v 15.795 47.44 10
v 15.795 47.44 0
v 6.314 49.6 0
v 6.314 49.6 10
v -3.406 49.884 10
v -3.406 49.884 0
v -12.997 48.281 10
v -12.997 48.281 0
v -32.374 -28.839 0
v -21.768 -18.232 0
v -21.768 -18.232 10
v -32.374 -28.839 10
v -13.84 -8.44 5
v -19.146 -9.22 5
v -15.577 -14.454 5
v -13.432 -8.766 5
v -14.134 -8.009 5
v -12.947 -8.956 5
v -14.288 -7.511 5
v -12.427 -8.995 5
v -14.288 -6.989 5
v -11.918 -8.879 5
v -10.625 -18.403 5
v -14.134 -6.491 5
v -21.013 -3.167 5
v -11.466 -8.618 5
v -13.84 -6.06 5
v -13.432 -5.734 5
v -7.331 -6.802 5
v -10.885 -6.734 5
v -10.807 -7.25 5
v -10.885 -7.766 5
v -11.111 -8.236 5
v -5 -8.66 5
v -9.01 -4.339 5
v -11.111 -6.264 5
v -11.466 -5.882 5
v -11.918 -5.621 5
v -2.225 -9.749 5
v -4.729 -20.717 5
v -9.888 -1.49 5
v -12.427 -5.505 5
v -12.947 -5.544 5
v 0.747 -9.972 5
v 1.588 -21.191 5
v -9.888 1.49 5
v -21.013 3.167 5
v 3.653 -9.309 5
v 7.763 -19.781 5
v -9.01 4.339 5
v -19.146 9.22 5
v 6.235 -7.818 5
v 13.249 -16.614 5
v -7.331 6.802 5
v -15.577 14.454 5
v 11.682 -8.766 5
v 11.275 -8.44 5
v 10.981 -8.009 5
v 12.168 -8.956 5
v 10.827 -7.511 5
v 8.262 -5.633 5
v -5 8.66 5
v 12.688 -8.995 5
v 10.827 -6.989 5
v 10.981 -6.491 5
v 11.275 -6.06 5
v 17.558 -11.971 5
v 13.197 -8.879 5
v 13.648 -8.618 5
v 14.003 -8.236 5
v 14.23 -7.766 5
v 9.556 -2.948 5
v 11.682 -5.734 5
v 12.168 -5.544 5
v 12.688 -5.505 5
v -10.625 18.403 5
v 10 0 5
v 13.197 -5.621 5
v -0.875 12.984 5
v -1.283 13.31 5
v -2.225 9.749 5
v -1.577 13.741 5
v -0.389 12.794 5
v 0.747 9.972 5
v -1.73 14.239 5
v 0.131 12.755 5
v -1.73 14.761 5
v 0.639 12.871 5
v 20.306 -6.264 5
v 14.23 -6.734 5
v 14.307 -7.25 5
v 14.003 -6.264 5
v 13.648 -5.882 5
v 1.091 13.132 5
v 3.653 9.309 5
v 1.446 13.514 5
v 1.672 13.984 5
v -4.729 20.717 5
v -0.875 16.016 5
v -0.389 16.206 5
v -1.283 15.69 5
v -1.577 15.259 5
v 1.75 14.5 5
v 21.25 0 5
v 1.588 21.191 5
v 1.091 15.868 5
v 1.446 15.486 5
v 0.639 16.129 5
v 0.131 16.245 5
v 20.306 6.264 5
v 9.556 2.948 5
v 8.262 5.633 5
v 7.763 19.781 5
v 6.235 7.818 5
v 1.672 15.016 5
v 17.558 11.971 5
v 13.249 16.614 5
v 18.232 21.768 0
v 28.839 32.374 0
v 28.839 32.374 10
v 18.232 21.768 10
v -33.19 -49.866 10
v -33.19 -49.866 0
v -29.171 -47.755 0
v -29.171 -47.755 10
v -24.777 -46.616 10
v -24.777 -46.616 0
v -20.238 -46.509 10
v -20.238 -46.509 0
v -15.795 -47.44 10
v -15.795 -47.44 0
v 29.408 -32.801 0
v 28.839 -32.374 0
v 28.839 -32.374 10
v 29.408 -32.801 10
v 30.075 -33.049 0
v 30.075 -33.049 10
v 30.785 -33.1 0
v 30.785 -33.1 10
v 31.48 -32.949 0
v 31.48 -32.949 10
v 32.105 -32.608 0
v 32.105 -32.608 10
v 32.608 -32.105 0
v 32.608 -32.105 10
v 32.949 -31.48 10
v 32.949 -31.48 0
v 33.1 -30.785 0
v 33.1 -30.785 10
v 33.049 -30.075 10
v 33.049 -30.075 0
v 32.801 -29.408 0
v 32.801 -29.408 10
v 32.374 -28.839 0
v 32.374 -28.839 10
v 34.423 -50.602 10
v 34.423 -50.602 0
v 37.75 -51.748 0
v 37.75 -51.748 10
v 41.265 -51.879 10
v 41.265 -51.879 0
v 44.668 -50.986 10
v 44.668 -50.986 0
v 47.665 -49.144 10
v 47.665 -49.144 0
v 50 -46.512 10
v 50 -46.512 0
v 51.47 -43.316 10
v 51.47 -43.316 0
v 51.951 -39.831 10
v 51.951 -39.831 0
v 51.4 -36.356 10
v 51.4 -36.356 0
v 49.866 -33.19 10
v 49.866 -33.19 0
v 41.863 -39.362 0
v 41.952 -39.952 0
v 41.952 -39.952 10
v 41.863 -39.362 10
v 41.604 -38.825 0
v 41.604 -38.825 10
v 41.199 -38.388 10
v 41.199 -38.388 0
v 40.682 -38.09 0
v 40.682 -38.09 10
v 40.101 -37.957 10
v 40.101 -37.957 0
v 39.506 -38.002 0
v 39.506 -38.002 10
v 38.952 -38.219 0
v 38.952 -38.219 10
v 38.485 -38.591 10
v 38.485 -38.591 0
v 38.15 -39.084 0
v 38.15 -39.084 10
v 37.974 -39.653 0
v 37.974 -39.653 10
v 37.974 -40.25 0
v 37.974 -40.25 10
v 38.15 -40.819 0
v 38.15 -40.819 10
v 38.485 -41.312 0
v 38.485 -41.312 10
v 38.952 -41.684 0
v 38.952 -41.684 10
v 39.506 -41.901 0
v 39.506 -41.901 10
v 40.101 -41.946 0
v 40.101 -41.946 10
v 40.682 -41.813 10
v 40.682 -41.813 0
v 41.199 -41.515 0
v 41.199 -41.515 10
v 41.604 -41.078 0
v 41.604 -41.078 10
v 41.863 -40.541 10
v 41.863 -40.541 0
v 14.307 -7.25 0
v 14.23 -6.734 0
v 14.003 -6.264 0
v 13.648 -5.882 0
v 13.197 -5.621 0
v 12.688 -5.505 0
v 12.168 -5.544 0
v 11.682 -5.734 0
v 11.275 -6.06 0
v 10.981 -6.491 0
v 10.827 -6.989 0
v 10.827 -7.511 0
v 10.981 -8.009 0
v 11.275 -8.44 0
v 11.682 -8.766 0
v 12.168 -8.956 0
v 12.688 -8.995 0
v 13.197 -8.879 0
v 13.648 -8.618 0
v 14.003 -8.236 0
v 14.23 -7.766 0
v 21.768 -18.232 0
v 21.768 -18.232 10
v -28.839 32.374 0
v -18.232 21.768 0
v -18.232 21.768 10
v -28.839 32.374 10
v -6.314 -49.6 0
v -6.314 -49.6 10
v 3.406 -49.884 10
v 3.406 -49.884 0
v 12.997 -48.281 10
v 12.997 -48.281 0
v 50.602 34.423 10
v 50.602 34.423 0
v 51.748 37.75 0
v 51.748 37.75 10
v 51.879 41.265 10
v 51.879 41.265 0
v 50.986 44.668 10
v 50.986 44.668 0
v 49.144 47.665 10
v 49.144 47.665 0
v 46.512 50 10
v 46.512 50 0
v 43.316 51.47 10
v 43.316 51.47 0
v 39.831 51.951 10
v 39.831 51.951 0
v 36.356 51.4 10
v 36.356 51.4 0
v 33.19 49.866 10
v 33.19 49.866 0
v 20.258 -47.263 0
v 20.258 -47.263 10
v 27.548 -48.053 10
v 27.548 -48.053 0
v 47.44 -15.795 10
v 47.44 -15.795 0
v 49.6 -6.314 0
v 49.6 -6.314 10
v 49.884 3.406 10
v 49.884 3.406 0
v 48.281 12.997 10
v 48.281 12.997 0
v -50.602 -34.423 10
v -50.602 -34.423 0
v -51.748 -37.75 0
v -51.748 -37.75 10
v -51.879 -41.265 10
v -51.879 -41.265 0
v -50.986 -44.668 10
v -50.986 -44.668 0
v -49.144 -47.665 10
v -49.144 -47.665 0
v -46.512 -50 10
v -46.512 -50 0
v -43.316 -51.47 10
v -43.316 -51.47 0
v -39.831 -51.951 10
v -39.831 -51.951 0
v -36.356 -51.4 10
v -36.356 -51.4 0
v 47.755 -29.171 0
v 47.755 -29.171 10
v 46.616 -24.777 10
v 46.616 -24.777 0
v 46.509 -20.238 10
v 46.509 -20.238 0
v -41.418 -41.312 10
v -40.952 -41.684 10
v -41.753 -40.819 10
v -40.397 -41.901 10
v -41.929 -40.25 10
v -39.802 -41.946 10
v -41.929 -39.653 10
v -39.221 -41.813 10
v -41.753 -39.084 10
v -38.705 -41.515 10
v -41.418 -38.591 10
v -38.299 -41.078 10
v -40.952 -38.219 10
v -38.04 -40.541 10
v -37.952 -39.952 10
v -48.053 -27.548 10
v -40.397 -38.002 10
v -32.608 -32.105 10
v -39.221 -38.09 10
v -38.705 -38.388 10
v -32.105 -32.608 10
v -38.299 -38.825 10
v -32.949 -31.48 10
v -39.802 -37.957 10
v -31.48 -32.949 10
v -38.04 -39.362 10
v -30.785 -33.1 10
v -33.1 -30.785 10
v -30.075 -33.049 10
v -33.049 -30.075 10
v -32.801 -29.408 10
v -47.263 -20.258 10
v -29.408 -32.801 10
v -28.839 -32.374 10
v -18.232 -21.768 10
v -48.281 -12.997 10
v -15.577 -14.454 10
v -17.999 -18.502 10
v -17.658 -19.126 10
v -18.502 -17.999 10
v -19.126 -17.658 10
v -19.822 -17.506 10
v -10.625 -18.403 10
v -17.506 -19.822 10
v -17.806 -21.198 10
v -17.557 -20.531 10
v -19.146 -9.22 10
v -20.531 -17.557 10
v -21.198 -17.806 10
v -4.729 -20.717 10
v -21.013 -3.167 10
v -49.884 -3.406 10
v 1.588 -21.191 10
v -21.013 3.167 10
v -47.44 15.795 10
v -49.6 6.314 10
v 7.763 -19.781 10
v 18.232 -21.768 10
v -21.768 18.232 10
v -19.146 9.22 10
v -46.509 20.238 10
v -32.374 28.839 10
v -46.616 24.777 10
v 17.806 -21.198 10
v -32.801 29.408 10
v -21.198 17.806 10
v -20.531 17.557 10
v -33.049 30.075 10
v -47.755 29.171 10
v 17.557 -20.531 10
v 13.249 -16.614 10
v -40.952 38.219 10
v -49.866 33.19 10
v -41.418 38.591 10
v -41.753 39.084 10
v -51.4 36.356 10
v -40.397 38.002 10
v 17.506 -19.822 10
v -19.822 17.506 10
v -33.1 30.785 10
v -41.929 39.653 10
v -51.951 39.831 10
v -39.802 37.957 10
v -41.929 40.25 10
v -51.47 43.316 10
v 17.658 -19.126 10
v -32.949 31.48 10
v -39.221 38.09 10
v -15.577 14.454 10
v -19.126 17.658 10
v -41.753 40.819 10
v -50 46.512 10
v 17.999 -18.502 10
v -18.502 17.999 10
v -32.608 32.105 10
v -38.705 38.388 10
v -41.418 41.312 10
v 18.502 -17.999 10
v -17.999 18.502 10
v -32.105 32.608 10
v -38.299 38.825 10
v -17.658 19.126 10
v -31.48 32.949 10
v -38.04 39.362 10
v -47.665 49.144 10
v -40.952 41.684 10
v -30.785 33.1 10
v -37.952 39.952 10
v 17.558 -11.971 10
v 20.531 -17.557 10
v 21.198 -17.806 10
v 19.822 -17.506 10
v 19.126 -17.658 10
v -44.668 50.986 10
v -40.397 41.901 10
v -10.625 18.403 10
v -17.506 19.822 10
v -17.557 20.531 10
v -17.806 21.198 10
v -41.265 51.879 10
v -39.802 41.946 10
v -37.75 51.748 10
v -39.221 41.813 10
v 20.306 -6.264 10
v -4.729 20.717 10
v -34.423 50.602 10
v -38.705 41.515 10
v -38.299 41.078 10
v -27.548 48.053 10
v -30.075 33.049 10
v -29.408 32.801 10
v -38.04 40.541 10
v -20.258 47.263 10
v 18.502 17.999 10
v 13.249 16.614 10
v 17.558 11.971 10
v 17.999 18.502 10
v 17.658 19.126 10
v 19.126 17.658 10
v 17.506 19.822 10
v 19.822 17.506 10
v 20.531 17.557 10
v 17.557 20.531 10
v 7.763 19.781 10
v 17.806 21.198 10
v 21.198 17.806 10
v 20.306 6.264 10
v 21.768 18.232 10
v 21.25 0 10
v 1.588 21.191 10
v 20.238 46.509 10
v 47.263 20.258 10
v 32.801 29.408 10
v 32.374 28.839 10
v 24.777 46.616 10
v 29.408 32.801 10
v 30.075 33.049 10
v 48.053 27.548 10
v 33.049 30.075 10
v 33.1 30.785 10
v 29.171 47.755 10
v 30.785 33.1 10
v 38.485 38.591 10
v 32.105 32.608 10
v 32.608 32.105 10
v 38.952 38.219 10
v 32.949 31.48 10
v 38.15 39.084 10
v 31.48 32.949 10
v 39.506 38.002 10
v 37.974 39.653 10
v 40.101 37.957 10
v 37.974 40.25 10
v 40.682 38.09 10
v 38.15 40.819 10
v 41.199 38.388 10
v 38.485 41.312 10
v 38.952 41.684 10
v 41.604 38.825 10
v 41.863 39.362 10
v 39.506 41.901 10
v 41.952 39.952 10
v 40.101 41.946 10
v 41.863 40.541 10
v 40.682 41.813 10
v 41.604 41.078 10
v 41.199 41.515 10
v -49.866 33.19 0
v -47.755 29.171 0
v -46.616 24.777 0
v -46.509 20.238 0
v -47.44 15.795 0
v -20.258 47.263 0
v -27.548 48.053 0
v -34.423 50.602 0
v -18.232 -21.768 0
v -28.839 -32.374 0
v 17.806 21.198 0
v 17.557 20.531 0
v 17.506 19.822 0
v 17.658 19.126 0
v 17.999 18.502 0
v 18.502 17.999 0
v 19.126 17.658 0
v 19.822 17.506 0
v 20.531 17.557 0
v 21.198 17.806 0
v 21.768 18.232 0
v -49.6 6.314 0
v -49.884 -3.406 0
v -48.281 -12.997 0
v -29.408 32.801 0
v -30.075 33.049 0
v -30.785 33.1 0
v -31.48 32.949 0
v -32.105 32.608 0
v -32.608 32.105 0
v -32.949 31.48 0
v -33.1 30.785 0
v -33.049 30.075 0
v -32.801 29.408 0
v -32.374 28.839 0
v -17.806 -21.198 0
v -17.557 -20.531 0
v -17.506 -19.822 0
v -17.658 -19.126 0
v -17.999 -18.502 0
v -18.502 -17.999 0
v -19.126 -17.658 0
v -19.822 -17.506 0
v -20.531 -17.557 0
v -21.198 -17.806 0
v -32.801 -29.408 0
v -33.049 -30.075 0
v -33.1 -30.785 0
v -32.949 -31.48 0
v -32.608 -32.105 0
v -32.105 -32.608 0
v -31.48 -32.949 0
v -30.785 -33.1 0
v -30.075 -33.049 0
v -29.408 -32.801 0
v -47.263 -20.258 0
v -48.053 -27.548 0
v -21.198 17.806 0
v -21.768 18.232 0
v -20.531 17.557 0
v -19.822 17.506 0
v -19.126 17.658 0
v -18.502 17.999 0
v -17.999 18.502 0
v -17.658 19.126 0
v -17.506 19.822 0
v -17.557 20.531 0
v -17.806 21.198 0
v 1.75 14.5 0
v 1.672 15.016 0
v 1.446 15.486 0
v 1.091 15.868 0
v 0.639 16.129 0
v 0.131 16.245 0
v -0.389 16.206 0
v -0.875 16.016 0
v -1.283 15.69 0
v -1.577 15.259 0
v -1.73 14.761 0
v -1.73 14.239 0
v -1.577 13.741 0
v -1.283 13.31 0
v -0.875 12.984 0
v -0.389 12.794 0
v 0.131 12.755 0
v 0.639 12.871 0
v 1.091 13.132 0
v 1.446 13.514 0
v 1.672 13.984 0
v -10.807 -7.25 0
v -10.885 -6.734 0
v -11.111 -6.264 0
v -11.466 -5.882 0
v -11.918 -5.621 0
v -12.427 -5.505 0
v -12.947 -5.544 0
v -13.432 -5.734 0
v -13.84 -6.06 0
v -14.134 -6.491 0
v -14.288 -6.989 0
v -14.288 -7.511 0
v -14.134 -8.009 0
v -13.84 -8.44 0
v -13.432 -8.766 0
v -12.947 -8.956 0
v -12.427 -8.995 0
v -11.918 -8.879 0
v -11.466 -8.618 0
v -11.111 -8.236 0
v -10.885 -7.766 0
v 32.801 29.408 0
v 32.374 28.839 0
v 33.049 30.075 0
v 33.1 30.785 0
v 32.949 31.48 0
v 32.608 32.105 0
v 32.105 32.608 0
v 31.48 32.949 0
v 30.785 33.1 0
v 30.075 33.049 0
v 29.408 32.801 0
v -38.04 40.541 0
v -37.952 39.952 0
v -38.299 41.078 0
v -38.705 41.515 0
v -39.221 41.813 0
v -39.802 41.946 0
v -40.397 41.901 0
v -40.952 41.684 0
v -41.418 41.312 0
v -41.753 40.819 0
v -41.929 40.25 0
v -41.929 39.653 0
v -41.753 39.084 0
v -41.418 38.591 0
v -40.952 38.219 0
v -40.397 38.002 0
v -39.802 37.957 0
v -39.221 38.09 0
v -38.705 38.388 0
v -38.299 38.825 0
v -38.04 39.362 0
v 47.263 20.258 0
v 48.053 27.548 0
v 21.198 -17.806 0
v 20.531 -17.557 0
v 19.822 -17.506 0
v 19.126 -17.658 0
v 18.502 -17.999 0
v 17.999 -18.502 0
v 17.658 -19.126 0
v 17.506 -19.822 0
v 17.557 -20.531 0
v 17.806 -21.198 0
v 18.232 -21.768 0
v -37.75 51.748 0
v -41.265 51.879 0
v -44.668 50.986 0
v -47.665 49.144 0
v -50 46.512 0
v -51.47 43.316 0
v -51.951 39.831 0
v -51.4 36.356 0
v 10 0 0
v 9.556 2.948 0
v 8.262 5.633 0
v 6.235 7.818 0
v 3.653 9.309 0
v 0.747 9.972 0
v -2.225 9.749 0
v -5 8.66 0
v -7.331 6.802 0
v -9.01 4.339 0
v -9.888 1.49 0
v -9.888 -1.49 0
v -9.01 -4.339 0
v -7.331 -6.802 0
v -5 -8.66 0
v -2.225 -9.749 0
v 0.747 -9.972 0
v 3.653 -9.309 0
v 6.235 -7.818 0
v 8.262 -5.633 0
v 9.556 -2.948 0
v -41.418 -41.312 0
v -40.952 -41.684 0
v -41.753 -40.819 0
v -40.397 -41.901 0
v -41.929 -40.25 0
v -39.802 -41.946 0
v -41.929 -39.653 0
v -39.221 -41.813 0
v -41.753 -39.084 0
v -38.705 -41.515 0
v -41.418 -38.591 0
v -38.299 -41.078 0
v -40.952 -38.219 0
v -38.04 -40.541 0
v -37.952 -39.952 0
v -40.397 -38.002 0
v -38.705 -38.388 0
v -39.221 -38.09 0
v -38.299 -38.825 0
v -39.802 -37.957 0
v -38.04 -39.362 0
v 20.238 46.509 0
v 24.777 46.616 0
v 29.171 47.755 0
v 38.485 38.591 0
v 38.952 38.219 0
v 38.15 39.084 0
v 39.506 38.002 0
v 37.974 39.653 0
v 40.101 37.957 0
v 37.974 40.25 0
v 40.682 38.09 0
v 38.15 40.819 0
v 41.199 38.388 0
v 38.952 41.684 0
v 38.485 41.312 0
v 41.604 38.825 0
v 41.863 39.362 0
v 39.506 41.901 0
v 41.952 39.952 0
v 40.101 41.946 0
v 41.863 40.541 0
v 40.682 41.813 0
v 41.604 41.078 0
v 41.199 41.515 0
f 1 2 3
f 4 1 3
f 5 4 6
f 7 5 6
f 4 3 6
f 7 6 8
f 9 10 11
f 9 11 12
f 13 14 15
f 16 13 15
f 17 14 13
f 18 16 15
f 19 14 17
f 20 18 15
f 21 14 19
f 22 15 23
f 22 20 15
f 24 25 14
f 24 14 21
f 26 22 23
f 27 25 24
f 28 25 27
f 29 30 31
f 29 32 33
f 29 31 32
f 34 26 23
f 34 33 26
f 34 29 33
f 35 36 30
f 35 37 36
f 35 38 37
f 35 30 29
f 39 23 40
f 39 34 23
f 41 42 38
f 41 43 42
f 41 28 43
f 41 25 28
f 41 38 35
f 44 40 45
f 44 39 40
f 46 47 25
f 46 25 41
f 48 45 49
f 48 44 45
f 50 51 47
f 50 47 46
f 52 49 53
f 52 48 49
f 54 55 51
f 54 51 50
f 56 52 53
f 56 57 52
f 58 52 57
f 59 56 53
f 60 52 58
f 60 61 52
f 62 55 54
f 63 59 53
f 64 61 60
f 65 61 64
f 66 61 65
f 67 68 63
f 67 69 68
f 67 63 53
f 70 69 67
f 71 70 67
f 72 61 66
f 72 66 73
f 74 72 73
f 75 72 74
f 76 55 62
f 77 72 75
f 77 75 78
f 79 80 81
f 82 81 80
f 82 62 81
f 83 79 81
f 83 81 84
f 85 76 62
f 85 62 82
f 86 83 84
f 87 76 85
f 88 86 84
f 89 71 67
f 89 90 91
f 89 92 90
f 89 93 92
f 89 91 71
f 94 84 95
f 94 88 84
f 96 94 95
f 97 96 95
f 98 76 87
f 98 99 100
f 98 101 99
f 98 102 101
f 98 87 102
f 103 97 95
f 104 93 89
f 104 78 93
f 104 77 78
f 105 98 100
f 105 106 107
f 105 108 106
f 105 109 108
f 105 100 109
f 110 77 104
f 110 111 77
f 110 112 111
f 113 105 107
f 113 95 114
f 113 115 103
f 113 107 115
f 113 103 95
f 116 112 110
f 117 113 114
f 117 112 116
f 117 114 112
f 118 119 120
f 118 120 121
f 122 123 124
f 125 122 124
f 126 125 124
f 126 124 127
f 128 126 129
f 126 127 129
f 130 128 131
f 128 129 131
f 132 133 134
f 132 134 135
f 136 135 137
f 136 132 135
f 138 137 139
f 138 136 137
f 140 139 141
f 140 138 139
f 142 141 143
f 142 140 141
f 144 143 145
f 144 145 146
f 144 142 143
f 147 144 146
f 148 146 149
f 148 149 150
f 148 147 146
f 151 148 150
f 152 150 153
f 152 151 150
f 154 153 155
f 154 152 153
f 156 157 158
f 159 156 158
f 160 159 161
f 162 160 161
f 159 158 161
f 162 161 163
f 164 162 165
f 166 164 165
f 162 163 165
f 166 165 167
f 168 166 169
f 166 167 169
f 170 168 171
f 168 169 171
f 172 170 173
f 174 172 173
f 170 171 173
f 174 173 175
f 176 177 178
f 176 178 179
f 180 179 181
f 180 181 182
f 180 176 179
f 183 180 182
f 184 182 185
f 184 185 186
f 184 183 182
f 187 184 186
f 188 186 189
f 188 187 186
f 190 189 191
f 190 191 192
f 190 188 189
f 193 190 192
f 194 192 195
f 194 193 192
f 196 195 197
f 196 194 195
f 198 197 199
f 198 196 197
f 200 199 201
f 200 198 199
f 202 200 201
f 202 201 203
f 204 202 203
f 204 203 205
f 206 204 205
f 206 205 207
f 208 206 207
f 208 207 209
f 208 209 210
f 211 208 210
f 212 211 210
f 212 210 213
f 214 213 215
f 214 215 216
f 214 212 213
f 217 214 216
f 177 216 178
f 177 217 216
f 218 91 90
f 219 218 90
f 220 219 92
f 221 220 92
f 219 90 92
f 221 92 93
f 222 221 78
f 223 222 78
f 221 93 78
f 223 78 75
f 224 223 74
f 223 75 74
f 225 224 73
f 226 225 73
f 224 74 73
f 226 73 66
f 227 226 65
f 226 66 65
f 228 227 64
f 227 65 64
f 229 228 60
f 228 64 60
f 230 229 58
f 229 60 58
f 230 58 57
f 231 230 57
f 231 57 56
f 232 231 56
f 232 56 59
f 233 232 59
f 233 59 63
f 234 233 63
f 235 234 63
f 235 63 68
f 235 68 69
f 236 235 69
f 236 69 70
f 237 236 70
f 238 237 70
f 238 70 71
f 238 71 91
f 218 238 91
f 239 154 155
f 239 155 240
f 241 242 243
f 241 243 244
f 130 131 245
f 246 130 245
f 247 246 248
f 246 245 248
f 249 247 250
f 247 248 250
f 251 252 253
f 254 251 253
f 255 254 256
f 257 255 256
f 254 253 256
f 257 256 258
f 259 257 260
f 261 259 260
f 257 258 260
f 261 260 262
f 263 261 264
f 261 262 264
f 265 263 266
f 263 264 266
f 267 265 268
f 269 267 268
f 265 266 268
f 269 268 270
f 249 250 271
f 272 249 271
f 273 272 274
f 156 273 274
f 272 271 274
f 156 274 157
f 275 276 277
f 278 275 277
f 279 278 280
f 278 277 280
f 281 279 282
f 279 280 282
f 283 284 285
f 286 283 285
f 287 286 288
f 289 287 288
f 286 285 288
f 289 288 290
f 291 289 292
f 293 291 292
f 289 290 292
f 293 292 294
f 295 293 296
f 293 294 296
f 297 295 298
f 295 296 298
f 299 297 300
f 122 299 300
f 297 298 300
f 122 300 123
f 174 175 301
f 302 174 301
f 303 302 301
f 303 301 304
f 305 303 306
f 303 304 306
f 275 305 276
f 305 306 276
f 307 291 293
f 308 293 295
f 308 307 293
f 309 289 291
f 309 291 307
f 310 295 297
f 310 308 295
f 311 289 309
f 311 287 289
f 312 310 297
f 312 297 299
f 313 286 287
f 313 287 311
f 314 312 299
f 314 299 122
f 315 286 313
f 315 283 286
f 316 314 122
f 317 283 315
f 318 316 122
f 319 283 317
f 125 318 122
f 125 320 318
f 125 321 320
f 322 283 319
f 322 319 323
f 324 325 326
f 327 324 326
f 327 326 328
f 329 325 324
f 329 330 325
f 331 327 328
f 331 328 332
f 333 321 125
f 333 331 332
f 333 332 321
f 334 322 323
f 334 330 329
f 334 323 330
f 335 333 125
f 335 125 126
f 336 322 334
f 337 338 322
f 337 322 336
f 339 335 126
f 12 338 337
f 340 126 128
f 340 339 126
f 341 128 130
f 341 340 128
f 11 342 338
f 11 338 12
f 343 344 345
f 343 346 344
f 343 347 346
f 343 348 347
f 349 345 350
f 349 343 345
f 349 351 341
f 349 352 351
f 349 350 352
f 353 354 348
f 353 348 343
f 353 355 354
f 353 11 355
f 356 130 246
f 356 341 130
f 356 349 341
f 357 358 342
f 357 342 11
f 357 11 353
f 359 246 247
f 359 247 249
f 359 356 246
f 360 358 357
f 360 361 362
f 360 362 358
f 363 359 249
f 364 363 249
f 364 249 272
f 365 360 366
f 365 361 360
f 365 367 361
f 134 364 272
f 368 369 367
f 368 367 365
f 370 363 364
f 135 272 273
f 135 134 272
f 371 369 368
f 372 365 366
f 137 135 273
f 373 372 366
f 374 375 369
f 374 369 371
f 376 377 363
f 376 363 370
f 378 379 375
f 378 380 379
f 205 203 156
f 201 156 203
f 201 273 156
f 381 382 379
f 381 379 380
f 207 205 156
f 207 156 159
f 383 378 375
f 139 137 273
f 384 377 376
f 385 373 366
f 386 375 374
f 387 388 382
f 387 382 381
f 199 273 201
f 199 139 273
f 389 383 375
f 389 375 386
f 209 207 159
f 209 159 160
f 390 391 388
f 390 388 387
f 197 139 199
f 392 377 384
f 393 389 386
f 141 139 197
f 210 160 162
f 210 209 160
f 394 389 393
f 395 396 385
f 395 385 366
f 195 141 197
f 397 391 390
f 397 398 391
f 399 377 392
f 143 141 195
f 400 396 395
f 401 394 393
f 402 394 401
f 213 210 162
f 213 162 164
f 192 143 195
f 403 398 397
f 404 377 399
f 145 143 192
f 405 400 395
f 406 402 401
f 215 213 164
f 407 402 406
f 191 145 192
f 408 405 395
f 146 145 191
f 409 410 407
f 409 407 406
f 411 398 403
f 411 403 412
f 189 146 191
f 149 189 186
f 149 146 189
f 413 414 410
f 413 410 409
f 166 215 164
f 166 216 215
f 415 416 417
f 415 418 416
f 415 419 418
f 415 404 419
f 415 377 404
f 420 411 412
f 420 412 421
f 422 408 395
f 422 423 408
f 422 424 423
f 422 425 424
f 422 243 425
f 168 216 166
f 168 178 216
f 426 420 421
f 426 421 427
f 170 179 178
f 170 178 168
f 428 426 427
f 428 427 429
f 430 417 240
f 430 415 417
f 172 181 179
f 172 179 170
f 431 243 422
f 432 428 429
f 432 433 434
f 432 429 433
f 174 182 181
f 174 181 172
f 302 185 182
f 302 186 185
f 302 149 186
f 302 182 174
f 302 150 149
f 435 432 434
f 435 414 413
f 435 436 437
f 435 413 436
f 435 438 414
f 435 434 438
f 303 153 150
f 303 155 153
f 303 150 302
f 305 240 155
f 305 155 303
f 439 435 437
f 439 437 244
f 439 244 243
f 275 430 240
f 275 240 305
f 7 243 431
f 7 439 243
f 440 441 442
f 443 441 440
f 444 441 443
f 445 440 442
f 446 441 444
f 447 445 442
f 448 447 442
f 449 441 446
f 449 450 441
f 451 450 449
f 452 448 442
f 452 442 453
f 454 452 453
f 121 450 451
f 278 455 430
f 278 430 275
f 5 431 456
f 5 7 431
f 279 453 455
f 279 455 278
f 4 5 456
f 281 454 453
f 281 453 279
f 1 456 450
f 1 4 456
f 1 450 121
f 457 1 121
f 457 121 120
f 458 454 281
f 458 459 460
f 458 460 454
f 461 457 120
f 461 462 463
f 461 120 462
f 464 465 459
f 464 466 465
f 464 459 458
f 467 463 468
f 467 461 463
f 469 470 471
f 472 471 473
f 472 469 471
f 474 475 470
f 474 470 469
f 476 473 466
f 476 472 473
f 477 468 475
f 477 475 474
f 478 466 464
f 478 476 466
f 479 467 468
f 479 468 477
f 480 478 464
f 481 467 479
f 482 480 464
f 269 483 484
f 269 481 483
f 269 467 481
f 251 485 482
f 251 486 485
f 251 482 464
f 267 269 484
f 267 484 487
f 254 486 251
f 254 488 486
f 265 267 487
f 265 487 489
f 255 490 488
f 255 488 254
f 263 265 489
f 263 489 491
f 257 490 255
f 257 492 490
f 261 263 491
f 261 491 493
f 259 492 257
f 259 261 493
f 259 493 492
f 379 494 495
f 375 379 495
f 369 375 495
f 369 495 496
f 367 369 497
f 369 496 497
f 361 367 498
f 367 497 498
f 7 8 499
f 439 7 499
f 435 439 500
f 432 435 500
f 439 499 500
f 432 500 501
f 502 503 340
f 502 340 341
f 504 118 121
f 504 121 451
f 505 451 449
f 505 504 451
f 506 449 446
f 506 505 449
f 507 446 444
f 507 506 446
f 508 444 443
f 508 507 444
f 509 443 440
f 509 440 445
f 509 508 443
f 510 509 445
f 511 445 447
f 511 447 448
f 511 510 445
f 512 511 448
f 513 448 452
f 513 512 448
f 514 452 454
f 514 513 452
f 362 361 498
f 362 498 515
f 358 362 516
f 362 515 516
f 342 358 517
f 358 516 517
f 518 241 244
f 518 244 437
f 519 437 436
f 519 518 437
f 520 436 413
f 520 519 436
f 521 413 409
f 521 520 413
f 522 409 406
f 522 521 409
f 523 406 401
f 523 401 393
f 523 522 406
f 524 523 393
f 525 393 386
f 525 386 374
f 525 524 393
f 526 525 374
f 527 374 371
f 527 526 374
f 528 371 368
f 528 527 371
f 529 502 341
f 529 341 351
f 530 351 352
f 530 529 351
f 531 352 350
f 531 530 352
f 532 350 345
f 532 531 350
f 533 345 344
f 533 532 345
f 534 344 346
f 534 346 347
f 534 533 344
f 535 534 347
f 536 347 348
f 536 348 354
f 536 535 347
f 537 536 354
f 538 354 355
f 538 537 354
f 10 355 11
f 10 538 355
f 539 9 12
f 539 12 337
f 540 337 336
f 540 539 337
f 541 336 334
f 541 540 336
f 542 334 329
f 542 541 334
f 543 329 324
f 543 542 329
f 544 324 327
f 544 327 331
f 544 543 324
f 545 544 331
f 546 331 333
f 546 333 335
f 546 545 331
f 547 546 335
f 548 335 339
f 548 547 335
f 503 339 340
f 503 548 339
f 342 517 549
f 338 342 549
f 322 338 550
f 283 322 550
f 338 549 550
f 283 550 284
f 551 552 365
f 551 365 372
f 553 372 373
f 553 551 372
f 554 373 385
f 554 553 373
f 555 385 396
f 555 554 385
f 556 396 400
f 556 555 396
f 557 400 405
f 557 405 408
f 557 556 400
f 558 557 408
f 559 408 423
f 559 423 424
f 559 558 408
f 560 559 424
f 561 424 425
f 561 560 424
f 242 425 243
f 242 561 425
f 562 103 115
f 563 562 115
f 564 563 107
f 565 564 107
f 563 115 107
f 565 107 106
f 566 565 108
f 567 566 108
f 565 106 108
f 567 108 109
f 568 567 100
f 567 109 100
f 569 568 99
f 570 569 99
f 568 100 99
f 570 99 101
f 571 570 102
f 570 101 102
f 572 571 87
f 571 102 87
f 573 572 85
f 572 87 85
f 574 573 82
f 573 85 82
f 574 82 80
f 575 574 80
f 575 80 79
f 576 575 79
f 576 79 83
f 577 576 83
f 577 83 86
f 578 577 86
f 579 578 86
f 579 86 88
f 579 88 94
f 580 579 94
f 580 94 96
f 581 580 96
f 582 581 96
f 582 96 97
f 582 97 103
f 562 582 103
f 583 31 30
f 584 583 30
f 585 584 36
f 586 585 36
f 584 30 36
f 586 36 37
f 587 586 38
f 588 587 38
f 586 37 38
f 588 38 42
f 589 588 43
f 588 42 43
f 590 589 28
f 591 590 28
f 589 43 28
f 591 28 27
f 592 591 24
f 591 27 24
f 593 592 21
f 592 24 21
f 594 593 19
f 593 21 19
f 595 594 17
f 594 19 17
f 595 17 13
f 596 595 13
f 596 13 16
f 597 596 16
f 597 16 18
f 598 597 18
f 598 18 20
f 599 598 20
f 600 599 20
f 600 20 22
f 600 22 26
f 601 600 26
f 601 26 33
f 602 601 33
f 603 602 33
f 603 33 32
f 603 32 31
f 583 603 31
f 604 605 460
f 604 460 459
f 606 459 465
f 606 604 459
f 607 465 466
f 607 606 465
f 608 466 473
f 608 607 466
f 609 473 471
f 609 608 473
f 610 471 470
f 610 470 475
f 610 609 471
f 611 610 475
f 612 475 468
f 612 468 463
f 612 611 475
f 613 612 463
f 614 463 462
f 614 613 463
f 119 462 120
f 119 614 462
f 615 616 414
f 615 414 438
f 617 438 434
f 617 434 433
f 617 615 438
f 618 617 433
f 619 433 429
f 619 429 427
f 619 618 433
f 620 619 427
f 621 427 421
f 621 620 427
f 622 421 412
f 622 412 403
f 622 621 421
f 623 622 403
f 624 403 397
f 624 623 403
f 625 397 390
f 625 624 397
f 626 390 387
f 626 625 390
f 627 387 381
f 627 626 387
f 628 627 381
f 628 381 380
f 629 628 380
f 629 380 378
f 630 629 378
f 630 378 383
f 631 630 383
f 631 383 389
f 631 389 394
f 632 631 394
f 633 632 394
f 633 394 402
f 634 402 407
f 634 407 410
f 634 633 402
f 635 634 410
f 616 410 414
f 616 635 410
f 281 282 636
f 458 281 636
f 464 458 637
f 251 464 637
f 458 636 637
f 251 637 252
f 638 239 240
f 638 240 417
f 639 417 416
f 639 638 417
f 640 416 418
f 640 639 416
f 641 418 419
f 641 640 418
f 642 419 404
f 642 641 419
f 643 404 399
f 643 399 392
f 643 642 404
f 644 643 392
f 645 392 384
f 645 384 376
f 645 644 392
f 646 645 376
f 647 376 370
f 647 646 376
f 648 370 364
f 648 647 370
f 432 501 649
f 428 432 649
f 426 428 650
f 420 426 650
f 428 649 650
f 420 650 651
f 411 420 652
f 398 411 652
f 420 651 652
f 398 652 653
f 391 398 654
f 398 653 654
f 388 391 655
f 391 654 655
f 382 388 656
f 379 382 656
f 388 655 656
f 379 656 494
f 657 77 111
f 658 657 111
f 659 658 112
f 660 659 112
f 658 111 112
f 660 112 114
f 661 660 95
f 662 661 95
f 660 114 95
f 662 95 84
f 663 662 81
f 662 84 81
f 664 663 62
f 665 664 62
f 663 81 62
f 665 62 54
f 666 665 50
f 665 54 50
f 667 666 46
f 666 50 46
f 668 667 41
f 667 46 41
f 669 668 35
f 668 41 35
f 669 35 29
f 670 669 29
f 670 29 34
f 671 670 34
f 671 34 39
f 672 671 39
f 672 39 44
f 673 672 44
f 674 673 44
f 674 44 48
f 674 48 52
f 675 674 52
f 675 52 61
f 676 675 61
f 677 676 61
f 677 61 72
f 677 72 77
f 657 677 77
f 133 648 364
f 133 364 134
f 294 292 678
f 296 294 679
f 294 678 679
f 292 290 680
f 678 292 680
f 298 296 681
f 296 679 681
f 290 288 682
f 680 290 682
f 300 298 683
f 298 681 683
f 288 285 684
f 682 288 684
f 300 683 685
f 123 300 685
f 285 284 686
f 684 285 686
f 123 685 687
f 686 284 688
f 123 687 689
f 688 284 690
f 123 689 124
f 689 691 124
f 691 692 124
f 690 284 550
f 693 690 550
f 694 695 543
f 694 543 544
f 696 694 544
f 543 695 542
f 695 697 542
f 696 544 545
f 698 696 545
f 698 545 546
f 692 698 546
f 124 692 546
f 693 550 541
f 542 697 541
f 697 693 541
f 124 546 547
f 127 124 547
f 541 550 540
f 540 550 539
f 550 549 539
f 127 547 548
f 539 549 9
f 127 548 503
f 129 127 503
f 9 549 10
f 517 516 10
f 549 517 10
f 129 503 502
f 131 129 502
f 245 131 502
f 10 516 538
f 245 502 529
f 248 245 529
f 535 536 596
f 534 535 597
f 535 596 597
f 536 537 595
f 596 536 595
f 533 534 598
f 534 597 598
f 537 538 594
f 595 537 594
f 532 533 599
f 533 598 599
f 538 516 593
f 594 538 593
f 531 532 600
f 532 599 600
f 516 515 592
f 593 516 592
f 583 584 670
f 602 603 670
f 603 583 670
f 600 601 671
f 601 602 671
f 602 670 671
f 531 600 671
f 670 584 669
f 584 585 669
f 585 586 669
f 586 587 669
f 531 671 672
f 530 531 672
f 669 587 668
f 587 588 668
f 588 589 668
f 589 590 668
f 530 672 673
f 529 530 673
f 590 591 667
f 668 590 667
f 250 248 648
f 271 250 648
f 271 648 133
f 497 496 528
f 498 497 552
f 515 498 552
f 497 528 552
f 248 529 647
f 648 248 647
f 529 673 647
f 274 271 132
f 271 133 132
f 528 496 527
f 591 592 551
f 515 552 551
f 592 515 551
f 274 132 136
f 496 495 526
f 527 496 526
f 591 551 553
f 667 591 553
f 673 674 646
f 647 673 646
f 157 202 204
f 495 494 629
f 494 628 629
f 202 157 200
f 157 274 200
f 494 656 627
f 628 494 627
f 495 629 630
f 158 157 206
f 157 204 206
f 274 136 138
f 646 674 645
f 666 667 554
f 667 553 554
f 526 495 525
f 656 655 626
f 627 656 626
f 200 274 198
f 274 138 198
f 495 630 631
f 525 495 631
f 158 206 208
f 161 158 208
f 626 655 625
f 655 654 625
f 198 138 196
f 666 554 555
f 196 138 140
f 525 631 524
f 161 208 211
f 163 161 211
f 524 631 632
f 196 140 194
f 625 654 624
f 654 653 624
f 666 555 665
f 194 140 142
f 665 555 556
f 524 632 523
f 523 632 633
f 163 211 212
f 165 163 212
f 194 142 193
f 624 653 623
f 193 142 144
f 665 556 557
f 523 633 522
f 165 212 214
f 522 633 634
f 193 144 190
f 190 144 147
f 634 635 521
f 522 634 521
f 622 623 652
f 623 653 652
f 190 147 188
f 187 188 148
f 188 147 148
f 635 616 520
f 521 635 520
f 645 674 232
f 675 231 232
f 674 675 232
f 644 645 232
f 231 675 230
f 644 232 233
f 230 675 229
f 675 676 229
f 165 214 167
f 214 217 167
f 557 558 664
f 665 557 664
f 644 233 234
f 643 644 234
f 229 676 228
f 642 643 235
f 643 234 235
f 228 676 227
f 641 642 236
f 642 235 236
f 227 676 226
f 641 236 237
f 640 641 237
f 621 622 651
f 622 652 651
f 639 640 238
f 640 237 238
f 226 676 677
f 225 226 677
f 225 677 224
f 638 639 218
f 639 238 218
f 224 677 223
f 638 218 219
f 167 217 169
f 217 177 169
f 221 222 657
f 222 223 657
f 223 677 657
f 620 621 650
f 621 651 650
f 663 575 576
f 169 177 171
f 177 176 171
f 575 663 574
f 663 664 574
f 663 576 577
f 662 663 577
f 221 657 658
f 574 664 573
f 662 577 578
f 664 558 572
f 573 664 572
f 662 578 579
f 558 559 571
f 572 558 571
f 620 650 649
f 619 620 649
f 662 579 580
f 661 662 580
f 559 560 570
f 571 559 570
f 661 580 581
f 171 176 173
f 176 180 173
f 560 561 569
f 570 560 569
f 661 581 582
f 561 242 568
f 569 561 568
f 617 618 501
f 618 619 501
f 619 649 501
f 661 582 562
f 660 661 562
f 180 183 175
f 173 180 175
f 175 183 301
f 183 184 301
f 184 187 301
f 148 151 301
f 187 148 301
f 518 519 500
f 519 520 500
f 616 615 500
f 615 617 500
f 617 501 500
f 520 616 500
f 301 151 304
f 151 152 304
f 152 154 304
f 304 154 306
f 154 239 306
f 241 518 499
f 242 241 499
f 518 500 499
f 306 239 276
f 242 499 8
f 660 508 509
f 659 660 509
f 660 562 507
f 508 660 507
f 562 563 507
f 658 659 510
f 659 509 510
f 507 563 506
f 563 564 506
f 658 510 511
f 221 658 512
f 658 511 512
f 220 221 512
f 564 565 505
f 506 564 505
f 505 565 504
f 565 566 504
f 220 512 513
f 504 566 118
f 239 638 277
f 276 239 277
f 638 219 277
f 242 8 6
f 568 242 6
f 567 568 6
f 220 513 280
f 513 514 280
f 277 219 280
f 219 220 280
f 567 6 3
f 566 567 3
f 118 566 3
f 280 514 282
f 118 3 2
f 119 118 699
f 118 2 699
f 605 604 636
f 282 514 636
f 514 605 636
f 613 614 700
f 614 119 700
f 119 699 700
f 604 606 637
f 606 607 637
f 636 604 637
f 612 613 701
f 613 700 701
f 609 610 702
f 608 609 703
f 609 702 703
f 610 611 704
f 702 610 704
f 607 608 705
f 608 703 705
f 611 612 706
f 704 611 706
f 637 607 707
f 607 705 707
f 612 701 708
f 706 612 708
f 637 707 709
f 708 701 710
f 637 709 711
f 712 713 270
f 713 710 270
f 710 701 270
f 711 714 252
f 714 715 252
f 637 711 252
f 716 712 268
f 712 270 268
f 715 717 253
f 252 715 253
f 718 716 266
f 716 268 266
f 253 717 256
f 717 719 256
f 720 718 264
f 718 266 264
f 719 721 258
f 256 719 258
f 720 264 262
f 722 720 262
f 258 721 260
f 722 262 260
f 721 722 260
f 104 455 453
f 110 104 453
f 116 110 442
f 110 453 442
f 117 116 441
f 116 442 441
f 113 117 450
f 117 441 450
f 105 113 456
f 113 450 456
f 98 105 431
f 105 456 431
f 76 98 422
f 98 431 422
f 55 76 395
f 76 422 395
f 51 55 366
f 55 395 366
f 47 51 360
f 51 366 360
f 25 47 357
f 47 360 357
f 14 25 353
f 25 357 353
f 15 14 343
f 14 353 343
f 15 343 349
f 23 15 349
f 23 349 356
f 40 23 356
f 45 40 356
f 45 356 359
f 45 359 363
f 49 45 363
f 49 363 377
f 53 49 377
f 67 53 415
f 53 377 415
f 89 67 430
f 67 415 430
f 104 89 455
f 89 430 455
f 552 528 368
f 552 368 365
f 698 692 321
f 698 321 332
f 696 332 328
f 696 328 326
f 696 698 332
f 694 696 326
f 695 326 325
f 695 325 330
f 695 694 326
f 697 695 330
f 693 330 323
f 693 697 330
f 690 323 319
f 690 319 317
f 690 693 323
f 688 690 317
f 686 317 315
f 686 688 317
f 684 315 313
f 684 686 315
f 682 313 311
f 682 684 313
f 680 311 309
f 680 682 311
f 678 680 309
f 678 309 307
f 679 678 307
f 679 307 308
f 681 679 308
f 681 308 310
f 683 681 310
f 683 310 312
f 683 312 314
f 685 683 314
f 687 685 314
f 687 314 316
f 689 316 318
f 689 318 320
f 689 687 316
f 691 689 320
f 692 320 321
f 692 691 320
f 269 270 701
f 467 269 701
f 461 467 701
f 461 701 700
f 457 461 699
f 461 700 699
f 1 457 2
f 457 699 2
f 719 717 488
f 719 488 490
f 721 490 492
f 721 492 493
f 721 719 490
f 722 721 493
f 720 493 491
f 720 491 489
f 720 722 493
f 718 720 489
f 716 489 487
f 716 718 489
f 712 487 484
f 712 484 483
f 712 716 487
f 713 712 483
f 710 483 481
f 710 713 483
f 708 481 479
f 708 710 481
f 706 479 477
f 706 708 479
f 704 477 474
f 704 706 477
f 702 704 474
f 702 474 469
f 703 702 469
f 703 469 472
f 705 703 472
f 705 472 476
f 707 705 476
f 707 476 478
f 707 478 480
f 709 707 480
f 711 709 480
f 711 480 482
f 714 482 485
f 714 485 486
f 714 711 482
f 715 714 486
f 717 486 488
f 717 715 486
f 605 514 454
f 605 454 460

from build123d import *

# Parameters (mm, degrees)
SKETCH2_R           = 2
BOSS_EXTRUDE1_DEPTH = 10
SKETCH3_R           = 21.25
SKETCH3_R_2         = 1.75
SKETCH3_R_3         = 10
CUT_EXTRUDE1_DEPTH  = 5
SKETCH3_2_R         = 1.75
CUT_EXTRUDE2_DEPTH  = 75.1479844
SKETCH3_3_R         = 10
CUT_EXTRUDE3_DEPTH  = 75.1479844


with BuildPart() as part:
    # Sketch2 → Boss-Extrude1 (new body)
    with BuildSketch(Plane.XY):
        with BuildLine():
            ThreePointArc((47.439646086, -15.794935239), (49.978651673, -1.460950691), (48.281273579, 12.996869684))
            ThreePointArc((48.281273579, 12.996869684), (47.432136683, 23.927789331), (50.602299686, 34.423317157))
            ThreePointArc((50.602299686, 34.423317157), (47.913811427, 48.929401728), (33.190424757, 49.865534018))
            ThreePointArc((33.190424757, 49.865534018), (24.776660442, 46.616230999), (15.794935239, 47.439646086))
            ThreePointArc((15.794935239, 47.439646086), (1.460950691, 49.978651673), (-12.996869684, 48.281273579))
            ThreePointArc((-12.996869684, 48.281273579), (-23.927789331, 47.432136683), (-34.423317157, 50.602299686))
            ThreePointArc((-34.423317157, 50.602299686), (-48.929401728, 47.913811427), (-49.865534018, 33.190424757))
            ThreePointArc((-49.865534018, 33.190424757), (-46.616230999, 24.776660442), (-47.439646086, 15.794935239))
            ThreePointArc((-47.439646086, 15.794935239), (-49.978651673, 1.460950691), (-48.281273579, -12.996869684))
            ThreePointArc((-48.281273579, -12.996869684), (-47.432136683, -23.927789331), (-50.602299686, -34.423317157))
            ThreePointArc((-50.602299686, -34.423317157), (-47.913811427, -48.929401728), (-33.190424757, -49.865534018))
            ThreePointArc((-33.190424757, -49.865534018), (-24.776660442, -46.616230999), (-15.794935239, -47.439646086))
            ThreePointArc((-15.794935239, -47.439646086), (-1.460950691, -49.978651673), (12.996869684, -48.281273579))
            ThreePointArc((12.996869684, -48.281273579), (23.927789331, -47.432136683), (34.423317157, -50.602299686))
            ThreePointArc((34.423317157, -50.602299686), (48.929401728, -47.913811427), (49.865534018, -33.190424757))
            ThreePointArc((49.865534018, -33.190424757), (46.616230999, -24.776660442), (47.439646086, -15.794935239))
        make_face()
        with BuildLine():
            ThreePointArc((-28.838834765, -32.374368671), (-32.374368671, -32.374368671), (-32.374368671, -28.838834765))
            Line((-32.374368671, -28.838834765), (-21.767766953, -18.232233047))
            ThreePointArc((-21.767766953, -18.232233047), (-18.232233047, -18.232233047), (-18.232233047, -21.767766953))
            Line((-18.232233047, -21.767766953), (-28.838834765, -32.374368671))
        make_face(mode=Mode.SUBTRACT)
        with BuildLine():
            ThreePointArc((32.374368671, -28.838834765), (32.374368671, -32.374368671), (28.838834765, -32.374368671))
            Line((28.838834765, -32.374368671), (18.232233047, -21.767766953))
            ThreePointArc((18.232233047, -21.767766953), (18.232233047, -18.232233047), (21.767766953, -18.232233047))
            Line((21.767766953, -18.232233047), (32.374368671, -28.838834765))
        make_face(mode=Mode.SUBTRACT)
        with BuildLine():
            ThreePointArc((-32.374368671, 28.838834765), (-32.374368671, 32.374368671), (-28.838834765, 32.374368671))
            Line((-28.838834765, 32.374368671), (-18.232233047, 21.767766953))
            ThreePointArc((-18.232233047, 21.767766953), (-18.232233047, 18.232233047), (-21.767766953, 18.232233047))
            Line((-21.767766953, 18.232233047), (-32.374368671, 28.838834765))
        make_face(mode=Mode.SUBTRACT)
        with BuildLine():
            ThreePointArc((28.838834765, 32.374368671), (32.374368671, 32.374368671), (32.374368671, 28.838834765))
            Line((32.374368671, 28.838834765), (21.767766953, 18.232233047))
            ThreePointArc((21.767766953, 18.232233047), (18.232233047, 18.232233047), (18.232233047, 21.767766953))
            Line((18.232233047, 21.767766953), (28.838834765, 32.374368671))
        make_face(mode=Mode.SUBTRACT)
        with Locations((39.951533137, -39.951533137)):
            Circle(SKETCH2_R, mode=Mode.SUBTRACT)
        with Locations((-39.951533137, -39.951533137)):
            Circle(SKETCH2_R, mode=Mode.SUBTRACT)
        with Locations((-39.951533137, 39.951533137)):
            Circle(SKETCH2_R, mode=Mode.SUBTRACT)
        with Locations((39.951533137, 39.951533137)):
            Circle(SKETCH2_R, mode=Mode.SUBTRACT)
    extrude(amount=BOSS_EXTRUDE1_DEPTH)

    # Sketch3 → Cut-Extrude1 (cut)
    with BuildSketch(Plane.XY.offset(10)):
        Circle(SKETCH3_R)
        with Locations((0, 14.5)):
            Circle(SKETCH3_R_2, mode=Mode.SUBTRACT)
        with Locations((12.557368355, -7.25)):
            Circle(SKETCH3_R_2, mode=Mode.SUBTRACT)
        with Locations((-12.557368355, -7.25)):
            Circle(SKETCH3_R_2, mode=Mode.SUBTRACT)
        Circle(SKETCH3_R_3, mode=Mode.SUBTRACT)
    extrude(amount=-CUT_EXTRUDE1_DEPTH, mode=Mode.SUBTRACT)

    # Sketch3<2> → Cut-Extrude2 (cut, through all)
    with BuildSketch(Plane.XY.offset(10)):
        with Locations((0, 14.5)):
            Circle(SKETCH3_2_R)
        with Locations((12.557368355, -7.25)):
            Circle(SKETCH3_2_R)
        with Locations((-12.557368355, -7.25)):
            Circle(SKETCH3_2_R)
    extrude(amount=-CUT_EXTRUDE2_DEPTH, mode=Mode.SUBTRACT)

    # Sketch3<3> → Cut-Extrude3 (cut, through all)
    with BuildSketch(Plane.XY.offset(10)):
        Circle(SKETCH3_3_R)
    extrude(amount=-CUT_EXTRUDE3_DEPTH, mode=Mode.SUBTRACT)


solid = part.part
